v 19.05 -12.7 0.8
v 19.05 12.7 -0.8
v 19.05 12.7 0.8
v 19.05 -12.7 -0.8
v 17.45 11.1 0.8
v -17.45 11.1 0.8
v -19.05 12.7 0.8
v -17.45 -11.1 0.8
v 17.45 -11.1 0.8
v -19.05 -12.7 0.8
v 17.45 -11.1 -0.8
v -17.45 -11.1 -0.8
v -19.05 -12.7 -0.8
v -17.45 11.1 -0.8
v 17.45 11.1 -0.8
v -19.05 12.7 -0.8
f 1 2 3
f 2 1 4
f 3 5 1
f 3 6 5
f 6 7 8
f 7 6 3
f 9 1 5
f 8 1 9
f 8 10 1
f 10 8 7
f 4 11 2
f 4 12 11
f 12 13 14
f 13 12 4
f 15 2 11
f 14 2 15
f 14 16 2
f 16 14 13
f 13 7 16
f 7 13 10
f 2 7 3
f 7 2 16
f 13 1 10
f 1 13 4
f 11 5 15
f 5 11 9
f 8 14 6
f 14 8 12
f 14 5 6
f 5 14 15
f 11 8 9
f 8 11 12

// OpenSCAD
difference() {
    cube([38.1, 25.4, 1.6], center=true);
    translate([0, 0, -0.8])
        cube([38.1 - 2*1.6, 25.4 - 2*1.6, 1.6 + 1.6], center=true);
}
